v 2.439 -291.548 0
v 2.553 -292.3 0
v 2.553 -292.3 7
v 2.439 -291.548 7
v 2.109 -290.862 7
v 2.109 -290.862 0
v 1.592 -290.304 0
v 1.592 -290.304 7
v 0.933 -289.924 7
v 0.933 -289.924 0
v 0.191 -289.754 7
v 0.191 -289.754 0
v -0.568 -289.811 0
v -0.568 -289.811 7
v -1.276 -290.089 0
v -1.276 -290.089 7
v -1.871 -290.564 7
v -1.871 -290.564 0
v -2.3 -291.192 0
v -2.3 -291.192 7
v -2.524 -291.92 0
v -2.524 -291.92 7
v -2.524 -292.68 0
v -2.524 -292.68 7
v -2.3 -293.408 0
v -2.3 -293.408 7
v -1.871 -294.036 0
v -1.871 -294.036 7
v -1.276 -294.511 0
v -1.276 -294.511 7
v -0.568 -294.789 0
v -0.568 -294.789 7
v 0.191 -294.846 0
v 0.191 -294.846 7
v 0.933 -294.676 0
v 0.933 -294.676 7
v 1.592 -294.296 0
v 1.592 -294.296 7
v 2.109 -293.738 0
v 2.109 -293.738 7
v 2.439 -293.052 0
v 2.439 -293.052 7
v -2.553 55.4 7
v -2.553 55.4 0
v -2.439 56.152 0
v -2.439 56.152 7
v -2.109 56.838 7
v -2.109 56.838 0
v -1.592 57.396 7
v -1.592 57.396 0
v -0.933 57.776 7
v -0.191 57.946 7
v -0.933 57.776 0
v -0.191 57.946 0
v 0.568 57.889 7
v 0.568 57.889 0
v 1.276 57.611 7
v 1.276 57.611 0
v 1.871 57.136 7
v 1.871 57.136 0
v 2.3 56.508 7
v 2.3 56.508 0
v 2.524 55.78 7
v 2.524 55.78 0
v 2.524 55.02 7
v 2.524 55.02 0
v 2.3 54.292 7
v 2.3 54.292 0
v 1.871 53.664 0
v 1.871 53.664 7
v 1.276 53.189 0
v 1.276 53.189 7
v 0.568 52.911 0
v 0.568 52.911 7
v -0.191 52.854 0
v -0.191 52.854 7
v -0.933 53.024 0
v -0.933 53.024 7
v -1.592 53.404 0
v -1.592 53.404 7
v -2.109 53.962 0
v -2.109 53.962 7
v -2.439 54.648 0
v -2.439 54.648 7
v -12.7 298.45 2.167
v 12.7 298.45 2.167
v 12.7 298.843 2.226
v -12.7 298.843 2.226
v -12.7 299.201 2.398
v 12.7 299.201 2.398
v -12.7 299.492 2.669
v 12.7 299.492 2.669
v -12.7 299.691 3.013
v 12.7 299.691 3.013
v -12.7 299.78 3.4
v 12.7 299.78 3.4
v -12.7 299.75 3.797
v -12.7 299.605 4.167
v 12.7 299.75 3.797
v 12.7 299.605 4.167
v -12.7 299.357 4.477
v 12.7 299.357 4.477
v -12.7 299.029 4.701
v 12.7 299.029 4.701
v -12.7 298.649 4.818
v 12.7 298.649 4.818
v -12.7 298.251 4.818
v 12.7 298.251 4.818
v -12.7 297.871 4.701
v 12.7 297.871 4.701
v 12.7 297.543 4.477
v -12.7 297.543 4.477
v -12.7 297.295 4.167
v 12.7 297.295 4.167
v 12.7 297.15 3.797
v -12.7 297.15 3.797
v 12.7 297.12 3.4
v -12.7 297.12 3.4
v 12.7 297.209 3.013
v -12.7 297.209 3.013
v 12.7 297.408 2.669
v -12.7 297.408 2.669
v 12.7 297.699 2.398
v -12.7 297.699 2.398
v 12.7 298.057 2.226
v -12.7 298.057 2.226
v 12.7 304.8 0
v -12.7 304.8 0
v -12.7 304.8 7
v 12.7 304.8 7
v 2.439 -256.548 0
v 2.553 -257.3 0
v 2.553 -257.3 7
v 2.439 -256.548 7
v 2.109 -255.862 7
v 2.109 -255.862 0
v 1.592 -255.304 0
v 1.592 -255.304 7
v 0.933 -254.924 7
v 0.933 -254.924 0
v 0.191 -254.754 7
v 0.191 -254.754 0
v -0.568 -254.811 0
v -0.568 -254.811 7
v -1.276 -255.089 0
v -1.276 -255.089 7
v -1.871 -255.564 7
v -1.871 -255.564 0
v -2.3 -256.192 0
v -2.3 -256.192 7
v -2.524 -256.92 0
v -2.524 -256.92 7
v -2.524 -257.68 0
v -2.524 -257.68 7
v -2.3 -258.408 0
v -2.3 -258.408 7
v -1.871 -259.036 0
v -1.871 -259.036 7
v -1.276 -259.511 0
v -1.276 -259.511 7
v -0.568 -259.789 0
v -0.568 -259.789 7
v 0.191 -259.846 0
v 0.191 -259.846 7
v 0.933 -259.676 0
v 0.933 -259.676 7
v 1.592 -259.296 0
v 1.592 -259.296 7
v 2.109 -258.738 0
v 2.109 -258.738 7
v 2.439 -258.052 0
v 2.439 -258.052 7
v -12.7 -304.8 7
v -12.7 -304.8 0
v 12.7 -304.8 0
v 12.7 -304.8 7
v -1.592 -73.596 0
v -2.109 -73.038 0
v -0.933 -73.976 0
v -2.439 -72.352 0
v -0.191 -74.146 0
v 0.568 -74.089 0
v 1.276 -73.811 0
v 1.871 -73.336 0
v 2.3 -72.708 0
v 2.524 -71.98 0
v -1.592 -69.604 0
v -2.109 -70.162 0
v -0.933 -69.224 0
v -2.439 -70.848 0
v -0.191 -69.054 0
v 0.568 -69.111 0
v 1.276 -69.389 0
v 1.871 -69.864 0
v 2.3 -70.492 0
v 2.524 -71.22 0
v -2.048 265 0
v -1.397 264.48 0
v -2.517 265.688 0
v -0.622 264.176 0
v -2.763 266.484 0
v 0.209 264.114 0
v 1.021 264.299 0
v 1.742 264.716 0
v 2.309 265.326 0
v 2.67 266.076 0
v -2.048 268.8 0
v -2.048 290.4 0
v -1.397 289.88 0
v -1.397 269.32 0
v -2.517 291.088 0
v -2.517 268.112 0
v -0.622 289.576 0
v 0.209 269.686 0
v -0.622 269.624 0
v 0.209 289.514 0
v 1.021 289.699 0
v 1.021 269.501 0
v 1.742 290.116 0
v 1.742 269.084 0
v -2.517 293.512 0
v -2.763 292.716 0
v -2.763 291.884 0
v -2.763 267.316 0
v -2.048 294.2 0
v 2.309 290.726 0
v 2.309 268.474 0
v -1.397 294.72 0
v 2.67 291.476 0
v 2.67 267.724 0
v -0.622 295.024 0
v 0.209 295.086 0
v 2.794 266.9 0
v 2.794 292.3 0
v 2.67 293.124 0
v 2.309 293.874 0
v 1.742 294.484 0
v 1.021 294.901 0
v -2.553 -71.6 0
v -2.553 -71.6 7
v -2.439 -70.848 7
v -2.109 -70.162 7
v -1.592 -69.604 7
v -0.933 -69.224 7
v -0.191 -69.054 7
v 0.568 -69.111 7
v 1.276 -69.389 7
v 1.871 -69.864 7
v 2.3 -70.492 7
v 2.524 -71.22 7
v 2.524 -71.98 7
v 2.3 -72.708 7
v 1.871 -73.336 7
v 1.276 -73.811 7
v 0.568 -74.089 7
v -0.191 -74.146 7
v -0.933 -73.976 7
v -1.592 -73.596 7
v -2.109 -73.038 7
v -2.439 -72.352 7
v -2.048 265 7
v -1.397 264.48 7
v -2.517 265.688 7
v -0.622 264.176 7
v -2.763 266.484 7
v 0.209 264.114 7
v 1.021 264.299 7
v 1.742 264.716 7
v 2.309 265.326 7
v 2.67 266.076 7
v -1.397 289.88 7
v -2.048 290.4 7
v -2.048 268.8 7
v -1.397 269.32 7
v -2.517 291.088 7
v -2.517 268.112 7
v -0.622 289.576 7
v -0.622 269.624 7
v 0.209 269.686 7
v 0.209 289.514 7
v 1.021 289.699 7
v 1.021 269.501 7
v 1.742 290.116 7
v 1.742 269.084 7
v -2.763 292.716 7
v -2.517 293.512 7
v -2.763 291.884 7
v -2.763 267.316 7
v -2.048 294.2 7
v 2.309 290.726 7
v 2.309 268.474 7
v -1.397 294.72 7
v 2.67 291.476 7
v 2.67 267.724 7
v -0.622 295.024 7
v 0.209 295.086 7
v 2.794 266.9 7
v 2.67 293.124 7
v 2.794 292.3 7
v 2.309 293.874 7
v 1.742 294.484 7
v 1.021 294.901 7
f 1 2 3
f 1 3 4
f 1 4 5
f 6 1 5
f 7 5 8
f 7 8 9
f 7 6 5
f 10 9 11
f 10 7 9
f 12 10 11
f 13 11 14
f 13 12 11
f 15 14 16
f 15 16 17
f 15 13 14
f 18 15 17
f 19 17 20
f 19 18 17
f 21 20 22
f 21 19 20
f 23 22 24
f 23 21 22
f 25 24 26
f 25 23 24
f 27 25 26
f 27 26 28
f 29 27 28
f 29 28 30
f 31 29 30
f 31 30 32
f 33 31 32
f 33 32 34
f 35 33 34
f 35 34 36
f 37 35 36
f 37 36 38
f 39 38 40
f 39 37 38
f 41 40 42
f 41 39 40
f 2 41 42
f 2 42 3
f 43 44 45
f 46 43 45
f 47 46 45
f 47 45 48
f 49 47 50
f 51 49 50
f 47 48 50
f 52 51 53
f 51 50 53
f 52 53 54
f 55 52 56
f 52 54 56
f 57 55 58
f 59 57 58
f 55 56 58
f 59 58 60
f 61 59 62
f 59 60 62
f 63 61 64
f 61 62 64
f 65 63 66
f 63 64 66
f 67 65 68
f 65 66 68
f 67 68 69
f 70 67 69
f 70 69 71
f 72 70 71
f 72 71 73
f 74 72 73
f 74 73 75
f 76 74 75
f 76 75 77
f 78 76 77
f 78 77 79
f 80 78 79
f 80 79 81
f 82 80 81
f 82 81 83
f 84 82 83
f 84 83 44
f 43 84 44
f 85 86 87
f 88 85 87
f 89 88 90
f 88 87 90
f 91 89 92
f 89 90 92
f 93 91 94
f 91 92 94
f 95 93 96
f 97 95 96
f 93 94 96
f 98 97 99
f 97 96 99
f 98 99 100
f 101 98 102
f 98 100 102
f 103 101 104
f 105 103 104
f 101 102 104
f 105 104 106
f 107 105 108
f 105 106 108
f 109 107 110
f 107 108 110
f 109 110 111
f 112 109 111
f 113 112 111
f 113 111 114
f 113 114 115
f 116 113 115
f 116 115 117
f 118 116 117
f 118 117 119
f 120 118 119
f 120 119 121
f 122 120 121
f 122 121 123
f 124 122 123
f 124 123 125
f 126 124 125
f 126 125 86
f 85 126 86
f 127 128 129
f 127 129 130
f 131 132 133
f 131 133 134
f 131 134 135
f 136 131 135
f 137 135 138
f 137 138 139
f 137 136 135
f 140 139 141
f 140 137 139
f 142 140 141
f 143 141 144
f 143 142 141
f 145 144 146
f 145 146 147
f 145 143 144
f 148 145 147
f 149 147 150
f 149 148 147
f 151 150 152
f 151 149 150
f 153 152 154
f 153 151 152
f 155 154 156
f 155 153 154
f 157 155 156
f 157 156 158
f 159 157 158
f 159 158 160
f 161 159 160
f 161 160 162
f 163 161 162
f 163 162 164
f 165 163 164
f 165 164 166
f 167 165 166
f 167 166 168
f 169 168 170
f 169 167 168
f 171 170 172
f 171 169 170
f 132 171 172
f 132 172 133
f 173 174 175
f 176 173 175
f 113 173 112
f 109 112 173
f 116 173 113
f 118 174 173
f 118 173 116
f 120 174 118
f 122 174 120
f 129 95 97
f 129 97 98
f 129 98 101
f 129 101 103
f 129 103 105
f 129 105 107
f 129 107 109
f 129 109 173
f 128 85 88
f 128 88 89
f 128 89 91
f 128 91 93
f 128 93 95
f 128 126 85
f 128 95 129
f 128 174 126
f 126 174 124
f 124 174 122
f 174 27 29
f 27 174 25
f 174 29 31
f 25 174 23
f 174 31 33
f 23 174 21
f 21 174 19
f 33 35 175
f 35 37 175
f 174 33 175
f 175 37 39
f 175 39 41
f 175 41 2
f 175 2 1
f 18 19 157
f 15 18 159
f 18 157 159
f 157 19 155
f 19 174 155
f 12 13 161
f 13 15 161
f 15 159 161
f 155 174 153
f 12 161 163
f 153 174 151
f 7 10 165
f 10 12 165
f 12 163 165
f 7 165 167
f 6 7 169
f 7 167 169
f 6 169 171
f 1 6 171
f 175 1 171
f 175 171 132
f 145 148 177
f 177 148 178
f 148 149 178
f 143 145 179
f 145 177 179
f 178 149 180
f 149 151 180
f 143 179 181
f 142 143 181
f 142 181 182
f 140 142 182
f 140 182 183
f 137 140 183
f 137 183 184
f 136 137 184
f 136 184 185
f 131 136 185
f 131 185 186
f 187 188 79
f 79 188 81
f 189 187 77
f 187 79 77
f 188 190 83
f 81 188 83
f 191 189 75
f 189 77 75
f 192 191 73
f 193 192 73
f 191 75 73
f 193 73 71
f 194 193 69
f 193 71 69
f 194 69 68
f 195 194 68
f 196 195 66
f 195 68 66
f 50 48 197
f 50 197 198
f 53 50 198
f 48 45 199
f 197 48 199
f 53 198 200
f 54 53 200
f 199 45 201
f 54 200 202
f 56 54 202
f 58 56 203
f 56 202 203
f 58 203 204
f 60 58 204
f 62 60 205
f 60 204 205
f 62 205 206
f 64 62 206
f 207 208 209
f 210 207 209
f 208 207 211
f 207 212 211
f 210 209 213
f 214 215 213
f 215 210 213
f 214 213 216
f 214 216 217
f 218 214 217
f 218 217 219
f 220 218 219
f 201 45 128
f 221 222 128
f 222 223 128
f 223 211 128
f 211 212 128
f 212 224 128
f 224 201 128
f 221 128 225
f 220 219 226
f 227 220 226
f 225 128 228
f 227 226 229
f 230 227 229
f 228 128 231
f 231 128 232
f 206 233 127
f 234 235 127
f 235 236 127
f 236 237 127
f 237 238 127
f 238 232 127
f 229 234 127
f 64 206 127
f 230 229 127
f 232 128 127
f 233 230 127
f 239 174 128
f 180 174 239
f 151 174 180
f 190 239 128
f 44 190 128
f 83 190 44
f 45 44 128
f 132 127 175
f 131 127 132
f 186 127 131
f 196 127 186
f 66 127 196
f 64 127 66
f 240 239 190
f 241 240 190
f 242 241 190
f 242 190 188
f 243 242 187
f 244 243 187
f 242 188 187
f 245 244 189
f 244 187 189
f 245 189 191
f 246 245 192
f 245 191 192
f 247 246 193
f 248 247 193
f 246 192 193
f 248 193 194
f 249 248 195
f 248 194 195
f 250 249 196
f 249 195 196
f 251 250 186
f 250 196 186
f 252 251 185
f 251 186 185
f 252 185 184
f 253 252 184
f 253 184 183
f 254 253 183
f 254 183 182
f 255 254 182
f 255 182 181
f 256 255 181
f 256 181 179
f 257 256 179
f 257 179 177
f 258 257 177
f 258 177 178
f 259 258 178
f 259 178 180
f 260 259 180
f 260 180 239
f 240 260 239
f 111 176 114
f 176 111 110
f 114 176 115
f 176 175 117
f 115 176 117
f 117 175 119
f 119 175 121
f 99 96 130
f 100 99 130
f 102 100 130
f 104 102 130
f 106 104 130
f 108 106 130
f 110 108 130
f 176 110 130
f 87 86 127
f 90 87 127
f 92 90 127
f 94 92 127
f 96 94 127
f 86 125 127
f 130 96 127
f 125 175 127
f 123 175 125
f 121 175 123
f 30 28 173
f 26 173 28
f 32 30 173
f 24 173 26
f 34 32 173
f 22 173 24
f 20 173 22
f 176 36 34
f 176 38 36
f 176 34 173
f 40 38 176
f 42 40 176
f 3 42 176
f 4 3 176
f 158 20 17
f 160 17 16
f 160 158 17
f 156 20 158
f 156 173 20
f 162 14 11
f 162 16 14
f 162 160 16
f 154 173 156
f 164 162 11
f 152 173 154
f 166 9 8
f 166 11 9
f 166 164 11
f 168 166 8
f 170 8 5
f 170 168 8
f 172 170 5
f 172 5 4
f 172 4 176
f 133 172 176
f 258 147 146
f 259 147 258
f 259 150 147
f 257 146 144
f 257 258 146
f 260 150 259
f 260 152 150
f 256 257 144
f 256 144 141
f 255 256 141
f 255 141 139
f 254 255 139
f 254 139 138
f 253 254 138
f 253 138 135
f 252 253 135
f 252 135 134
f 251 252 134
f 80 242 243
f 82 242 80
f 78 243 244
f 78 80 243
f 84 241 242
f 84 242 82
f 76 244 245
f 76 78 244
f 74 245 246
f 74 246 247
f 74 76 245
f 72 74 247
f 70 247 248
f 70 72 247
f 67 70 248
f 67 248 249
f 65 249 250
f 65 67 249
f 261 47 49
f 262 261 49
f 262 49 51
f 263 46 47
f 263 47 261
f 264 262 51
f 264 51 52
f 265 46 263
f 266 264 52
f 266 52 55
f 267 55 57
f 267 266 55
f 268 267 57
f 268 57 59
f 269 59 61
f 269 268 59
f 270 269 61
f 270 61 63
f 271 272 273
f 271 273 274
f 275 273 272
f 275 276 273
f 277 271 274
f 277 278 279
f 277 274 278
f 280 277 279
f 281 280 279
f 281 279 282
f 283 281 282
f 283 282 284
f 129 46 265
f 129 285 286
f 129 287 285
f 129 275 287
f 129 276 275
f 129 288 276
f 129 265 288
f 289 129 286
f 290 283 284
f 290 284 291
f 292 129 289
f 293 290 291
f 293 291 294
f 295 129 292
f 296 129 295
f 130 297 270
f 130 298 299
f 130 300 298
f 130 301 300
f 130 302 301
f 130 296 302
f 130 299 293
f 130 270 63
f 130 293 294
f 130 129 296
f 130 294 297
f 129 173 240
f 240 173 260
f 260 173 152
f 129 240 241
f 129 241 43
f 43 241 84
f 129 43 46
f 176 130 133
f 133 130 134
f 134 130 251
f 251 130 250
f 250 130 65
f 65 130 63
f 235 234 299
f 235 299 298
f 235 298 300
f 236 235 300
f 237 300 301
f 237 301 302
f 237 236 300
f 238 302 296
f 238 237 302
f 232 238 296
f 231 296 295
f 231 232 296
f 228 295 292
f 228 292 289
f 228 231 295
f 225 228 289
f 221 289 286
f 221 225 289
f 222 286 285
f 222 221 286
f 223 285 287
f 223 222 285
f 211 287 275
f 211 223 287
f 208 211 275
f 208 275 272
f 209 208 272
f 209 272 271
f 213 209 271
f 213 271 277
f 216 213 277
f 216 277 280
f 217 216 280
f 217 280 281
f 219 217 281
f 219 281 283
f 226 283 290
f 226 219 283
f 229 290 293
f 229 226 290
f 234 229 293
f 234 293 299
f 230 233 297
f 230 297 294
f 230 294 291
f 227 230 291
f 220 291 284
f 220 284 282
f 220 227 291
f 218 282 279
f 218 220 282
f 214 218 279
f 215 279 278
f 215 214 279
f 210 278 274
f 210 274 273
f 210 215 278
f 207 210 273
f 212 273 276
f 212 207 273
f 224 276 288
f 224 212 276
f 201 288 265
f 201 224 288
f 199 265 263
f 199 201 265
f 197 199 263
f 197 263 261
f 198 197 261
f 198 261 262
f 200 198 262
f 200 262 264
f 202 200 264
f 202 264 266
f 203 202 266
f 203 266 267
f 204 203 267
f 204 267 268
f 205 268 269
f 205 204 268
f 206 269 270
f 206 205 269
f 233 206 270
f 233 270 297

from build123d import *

# Parameters (mm, degrees)
SKETCH1_W           = 25.4
SKETCH1_H           = 609.6
SKETCH1_R           = 2.5527
SKETCH1_R_2         = 2.794
BOSS_EXTRUDE1_DEPTH = 7
SKETCH2_R           = 1.33338173
CUT_EXTRUDE1_DEPTH  = 306.936594738
SKETCH3_R           = 2.5527
CUT_EXTRUDE2_DEPTH  = 306.144768921


with BuildPart() as part:
    # Sketch1 → Boss-Extrude1 (new body)
    with BuildSketch(Plane.XY):
        Rectangle(SKETCH1_W, SKETCH1_H)
        with Locations((0, -257.3)):
            Circle(SKETCH1_R, mode=Mode.SUBTRACT)
        with Locations((0, -292.3)):
            Circle(SKETCH1_R, mode=Mode.SUBTRACT)
        with Locations((0, 292.2999996)):
            Circle(SKETCH1_R_2, mode=Mode.SUBTRACT)
        with Locations((0, 266.8999996)):
            Circle(SKETCH1_R_2, mode=Mode.SUBTRACT)
    extrude(amount=BOSS_EXTRUDE1_DEPTH)

    # Sketch2 → Cut-Extrude1 (cut, through all)
    with BuildSketch(Plane(origin=(12.7, 0, 0), x_dir=(0, 0, -1), z_dir=(1, 0, 0))):
        with Locations((-3.5, 298.45)):
            Circle(SKETCH2_R)
    extrude(amount=-CUT_EXTRUDE1_DEPTH, mode=Mode.SUBTRACT)

    # Sketch3 → Cut-Extrude2 (cut, through all)
    with BuildSketch(Plane(origin=(0, 0, 0), x_dir=(-1, 0, 0), z_dir=(0, 0, -1))):
        with Locations((0, -71.6)):
            Circle(SKETCH3_R)
        with Locations((0, 55.4)):
            Circle(SKETCH3_R)
    extrude(amount=-CUT_EXTRUDE2_DEPTH, mode=Mode.SUBTRACT)


solid = part.part
